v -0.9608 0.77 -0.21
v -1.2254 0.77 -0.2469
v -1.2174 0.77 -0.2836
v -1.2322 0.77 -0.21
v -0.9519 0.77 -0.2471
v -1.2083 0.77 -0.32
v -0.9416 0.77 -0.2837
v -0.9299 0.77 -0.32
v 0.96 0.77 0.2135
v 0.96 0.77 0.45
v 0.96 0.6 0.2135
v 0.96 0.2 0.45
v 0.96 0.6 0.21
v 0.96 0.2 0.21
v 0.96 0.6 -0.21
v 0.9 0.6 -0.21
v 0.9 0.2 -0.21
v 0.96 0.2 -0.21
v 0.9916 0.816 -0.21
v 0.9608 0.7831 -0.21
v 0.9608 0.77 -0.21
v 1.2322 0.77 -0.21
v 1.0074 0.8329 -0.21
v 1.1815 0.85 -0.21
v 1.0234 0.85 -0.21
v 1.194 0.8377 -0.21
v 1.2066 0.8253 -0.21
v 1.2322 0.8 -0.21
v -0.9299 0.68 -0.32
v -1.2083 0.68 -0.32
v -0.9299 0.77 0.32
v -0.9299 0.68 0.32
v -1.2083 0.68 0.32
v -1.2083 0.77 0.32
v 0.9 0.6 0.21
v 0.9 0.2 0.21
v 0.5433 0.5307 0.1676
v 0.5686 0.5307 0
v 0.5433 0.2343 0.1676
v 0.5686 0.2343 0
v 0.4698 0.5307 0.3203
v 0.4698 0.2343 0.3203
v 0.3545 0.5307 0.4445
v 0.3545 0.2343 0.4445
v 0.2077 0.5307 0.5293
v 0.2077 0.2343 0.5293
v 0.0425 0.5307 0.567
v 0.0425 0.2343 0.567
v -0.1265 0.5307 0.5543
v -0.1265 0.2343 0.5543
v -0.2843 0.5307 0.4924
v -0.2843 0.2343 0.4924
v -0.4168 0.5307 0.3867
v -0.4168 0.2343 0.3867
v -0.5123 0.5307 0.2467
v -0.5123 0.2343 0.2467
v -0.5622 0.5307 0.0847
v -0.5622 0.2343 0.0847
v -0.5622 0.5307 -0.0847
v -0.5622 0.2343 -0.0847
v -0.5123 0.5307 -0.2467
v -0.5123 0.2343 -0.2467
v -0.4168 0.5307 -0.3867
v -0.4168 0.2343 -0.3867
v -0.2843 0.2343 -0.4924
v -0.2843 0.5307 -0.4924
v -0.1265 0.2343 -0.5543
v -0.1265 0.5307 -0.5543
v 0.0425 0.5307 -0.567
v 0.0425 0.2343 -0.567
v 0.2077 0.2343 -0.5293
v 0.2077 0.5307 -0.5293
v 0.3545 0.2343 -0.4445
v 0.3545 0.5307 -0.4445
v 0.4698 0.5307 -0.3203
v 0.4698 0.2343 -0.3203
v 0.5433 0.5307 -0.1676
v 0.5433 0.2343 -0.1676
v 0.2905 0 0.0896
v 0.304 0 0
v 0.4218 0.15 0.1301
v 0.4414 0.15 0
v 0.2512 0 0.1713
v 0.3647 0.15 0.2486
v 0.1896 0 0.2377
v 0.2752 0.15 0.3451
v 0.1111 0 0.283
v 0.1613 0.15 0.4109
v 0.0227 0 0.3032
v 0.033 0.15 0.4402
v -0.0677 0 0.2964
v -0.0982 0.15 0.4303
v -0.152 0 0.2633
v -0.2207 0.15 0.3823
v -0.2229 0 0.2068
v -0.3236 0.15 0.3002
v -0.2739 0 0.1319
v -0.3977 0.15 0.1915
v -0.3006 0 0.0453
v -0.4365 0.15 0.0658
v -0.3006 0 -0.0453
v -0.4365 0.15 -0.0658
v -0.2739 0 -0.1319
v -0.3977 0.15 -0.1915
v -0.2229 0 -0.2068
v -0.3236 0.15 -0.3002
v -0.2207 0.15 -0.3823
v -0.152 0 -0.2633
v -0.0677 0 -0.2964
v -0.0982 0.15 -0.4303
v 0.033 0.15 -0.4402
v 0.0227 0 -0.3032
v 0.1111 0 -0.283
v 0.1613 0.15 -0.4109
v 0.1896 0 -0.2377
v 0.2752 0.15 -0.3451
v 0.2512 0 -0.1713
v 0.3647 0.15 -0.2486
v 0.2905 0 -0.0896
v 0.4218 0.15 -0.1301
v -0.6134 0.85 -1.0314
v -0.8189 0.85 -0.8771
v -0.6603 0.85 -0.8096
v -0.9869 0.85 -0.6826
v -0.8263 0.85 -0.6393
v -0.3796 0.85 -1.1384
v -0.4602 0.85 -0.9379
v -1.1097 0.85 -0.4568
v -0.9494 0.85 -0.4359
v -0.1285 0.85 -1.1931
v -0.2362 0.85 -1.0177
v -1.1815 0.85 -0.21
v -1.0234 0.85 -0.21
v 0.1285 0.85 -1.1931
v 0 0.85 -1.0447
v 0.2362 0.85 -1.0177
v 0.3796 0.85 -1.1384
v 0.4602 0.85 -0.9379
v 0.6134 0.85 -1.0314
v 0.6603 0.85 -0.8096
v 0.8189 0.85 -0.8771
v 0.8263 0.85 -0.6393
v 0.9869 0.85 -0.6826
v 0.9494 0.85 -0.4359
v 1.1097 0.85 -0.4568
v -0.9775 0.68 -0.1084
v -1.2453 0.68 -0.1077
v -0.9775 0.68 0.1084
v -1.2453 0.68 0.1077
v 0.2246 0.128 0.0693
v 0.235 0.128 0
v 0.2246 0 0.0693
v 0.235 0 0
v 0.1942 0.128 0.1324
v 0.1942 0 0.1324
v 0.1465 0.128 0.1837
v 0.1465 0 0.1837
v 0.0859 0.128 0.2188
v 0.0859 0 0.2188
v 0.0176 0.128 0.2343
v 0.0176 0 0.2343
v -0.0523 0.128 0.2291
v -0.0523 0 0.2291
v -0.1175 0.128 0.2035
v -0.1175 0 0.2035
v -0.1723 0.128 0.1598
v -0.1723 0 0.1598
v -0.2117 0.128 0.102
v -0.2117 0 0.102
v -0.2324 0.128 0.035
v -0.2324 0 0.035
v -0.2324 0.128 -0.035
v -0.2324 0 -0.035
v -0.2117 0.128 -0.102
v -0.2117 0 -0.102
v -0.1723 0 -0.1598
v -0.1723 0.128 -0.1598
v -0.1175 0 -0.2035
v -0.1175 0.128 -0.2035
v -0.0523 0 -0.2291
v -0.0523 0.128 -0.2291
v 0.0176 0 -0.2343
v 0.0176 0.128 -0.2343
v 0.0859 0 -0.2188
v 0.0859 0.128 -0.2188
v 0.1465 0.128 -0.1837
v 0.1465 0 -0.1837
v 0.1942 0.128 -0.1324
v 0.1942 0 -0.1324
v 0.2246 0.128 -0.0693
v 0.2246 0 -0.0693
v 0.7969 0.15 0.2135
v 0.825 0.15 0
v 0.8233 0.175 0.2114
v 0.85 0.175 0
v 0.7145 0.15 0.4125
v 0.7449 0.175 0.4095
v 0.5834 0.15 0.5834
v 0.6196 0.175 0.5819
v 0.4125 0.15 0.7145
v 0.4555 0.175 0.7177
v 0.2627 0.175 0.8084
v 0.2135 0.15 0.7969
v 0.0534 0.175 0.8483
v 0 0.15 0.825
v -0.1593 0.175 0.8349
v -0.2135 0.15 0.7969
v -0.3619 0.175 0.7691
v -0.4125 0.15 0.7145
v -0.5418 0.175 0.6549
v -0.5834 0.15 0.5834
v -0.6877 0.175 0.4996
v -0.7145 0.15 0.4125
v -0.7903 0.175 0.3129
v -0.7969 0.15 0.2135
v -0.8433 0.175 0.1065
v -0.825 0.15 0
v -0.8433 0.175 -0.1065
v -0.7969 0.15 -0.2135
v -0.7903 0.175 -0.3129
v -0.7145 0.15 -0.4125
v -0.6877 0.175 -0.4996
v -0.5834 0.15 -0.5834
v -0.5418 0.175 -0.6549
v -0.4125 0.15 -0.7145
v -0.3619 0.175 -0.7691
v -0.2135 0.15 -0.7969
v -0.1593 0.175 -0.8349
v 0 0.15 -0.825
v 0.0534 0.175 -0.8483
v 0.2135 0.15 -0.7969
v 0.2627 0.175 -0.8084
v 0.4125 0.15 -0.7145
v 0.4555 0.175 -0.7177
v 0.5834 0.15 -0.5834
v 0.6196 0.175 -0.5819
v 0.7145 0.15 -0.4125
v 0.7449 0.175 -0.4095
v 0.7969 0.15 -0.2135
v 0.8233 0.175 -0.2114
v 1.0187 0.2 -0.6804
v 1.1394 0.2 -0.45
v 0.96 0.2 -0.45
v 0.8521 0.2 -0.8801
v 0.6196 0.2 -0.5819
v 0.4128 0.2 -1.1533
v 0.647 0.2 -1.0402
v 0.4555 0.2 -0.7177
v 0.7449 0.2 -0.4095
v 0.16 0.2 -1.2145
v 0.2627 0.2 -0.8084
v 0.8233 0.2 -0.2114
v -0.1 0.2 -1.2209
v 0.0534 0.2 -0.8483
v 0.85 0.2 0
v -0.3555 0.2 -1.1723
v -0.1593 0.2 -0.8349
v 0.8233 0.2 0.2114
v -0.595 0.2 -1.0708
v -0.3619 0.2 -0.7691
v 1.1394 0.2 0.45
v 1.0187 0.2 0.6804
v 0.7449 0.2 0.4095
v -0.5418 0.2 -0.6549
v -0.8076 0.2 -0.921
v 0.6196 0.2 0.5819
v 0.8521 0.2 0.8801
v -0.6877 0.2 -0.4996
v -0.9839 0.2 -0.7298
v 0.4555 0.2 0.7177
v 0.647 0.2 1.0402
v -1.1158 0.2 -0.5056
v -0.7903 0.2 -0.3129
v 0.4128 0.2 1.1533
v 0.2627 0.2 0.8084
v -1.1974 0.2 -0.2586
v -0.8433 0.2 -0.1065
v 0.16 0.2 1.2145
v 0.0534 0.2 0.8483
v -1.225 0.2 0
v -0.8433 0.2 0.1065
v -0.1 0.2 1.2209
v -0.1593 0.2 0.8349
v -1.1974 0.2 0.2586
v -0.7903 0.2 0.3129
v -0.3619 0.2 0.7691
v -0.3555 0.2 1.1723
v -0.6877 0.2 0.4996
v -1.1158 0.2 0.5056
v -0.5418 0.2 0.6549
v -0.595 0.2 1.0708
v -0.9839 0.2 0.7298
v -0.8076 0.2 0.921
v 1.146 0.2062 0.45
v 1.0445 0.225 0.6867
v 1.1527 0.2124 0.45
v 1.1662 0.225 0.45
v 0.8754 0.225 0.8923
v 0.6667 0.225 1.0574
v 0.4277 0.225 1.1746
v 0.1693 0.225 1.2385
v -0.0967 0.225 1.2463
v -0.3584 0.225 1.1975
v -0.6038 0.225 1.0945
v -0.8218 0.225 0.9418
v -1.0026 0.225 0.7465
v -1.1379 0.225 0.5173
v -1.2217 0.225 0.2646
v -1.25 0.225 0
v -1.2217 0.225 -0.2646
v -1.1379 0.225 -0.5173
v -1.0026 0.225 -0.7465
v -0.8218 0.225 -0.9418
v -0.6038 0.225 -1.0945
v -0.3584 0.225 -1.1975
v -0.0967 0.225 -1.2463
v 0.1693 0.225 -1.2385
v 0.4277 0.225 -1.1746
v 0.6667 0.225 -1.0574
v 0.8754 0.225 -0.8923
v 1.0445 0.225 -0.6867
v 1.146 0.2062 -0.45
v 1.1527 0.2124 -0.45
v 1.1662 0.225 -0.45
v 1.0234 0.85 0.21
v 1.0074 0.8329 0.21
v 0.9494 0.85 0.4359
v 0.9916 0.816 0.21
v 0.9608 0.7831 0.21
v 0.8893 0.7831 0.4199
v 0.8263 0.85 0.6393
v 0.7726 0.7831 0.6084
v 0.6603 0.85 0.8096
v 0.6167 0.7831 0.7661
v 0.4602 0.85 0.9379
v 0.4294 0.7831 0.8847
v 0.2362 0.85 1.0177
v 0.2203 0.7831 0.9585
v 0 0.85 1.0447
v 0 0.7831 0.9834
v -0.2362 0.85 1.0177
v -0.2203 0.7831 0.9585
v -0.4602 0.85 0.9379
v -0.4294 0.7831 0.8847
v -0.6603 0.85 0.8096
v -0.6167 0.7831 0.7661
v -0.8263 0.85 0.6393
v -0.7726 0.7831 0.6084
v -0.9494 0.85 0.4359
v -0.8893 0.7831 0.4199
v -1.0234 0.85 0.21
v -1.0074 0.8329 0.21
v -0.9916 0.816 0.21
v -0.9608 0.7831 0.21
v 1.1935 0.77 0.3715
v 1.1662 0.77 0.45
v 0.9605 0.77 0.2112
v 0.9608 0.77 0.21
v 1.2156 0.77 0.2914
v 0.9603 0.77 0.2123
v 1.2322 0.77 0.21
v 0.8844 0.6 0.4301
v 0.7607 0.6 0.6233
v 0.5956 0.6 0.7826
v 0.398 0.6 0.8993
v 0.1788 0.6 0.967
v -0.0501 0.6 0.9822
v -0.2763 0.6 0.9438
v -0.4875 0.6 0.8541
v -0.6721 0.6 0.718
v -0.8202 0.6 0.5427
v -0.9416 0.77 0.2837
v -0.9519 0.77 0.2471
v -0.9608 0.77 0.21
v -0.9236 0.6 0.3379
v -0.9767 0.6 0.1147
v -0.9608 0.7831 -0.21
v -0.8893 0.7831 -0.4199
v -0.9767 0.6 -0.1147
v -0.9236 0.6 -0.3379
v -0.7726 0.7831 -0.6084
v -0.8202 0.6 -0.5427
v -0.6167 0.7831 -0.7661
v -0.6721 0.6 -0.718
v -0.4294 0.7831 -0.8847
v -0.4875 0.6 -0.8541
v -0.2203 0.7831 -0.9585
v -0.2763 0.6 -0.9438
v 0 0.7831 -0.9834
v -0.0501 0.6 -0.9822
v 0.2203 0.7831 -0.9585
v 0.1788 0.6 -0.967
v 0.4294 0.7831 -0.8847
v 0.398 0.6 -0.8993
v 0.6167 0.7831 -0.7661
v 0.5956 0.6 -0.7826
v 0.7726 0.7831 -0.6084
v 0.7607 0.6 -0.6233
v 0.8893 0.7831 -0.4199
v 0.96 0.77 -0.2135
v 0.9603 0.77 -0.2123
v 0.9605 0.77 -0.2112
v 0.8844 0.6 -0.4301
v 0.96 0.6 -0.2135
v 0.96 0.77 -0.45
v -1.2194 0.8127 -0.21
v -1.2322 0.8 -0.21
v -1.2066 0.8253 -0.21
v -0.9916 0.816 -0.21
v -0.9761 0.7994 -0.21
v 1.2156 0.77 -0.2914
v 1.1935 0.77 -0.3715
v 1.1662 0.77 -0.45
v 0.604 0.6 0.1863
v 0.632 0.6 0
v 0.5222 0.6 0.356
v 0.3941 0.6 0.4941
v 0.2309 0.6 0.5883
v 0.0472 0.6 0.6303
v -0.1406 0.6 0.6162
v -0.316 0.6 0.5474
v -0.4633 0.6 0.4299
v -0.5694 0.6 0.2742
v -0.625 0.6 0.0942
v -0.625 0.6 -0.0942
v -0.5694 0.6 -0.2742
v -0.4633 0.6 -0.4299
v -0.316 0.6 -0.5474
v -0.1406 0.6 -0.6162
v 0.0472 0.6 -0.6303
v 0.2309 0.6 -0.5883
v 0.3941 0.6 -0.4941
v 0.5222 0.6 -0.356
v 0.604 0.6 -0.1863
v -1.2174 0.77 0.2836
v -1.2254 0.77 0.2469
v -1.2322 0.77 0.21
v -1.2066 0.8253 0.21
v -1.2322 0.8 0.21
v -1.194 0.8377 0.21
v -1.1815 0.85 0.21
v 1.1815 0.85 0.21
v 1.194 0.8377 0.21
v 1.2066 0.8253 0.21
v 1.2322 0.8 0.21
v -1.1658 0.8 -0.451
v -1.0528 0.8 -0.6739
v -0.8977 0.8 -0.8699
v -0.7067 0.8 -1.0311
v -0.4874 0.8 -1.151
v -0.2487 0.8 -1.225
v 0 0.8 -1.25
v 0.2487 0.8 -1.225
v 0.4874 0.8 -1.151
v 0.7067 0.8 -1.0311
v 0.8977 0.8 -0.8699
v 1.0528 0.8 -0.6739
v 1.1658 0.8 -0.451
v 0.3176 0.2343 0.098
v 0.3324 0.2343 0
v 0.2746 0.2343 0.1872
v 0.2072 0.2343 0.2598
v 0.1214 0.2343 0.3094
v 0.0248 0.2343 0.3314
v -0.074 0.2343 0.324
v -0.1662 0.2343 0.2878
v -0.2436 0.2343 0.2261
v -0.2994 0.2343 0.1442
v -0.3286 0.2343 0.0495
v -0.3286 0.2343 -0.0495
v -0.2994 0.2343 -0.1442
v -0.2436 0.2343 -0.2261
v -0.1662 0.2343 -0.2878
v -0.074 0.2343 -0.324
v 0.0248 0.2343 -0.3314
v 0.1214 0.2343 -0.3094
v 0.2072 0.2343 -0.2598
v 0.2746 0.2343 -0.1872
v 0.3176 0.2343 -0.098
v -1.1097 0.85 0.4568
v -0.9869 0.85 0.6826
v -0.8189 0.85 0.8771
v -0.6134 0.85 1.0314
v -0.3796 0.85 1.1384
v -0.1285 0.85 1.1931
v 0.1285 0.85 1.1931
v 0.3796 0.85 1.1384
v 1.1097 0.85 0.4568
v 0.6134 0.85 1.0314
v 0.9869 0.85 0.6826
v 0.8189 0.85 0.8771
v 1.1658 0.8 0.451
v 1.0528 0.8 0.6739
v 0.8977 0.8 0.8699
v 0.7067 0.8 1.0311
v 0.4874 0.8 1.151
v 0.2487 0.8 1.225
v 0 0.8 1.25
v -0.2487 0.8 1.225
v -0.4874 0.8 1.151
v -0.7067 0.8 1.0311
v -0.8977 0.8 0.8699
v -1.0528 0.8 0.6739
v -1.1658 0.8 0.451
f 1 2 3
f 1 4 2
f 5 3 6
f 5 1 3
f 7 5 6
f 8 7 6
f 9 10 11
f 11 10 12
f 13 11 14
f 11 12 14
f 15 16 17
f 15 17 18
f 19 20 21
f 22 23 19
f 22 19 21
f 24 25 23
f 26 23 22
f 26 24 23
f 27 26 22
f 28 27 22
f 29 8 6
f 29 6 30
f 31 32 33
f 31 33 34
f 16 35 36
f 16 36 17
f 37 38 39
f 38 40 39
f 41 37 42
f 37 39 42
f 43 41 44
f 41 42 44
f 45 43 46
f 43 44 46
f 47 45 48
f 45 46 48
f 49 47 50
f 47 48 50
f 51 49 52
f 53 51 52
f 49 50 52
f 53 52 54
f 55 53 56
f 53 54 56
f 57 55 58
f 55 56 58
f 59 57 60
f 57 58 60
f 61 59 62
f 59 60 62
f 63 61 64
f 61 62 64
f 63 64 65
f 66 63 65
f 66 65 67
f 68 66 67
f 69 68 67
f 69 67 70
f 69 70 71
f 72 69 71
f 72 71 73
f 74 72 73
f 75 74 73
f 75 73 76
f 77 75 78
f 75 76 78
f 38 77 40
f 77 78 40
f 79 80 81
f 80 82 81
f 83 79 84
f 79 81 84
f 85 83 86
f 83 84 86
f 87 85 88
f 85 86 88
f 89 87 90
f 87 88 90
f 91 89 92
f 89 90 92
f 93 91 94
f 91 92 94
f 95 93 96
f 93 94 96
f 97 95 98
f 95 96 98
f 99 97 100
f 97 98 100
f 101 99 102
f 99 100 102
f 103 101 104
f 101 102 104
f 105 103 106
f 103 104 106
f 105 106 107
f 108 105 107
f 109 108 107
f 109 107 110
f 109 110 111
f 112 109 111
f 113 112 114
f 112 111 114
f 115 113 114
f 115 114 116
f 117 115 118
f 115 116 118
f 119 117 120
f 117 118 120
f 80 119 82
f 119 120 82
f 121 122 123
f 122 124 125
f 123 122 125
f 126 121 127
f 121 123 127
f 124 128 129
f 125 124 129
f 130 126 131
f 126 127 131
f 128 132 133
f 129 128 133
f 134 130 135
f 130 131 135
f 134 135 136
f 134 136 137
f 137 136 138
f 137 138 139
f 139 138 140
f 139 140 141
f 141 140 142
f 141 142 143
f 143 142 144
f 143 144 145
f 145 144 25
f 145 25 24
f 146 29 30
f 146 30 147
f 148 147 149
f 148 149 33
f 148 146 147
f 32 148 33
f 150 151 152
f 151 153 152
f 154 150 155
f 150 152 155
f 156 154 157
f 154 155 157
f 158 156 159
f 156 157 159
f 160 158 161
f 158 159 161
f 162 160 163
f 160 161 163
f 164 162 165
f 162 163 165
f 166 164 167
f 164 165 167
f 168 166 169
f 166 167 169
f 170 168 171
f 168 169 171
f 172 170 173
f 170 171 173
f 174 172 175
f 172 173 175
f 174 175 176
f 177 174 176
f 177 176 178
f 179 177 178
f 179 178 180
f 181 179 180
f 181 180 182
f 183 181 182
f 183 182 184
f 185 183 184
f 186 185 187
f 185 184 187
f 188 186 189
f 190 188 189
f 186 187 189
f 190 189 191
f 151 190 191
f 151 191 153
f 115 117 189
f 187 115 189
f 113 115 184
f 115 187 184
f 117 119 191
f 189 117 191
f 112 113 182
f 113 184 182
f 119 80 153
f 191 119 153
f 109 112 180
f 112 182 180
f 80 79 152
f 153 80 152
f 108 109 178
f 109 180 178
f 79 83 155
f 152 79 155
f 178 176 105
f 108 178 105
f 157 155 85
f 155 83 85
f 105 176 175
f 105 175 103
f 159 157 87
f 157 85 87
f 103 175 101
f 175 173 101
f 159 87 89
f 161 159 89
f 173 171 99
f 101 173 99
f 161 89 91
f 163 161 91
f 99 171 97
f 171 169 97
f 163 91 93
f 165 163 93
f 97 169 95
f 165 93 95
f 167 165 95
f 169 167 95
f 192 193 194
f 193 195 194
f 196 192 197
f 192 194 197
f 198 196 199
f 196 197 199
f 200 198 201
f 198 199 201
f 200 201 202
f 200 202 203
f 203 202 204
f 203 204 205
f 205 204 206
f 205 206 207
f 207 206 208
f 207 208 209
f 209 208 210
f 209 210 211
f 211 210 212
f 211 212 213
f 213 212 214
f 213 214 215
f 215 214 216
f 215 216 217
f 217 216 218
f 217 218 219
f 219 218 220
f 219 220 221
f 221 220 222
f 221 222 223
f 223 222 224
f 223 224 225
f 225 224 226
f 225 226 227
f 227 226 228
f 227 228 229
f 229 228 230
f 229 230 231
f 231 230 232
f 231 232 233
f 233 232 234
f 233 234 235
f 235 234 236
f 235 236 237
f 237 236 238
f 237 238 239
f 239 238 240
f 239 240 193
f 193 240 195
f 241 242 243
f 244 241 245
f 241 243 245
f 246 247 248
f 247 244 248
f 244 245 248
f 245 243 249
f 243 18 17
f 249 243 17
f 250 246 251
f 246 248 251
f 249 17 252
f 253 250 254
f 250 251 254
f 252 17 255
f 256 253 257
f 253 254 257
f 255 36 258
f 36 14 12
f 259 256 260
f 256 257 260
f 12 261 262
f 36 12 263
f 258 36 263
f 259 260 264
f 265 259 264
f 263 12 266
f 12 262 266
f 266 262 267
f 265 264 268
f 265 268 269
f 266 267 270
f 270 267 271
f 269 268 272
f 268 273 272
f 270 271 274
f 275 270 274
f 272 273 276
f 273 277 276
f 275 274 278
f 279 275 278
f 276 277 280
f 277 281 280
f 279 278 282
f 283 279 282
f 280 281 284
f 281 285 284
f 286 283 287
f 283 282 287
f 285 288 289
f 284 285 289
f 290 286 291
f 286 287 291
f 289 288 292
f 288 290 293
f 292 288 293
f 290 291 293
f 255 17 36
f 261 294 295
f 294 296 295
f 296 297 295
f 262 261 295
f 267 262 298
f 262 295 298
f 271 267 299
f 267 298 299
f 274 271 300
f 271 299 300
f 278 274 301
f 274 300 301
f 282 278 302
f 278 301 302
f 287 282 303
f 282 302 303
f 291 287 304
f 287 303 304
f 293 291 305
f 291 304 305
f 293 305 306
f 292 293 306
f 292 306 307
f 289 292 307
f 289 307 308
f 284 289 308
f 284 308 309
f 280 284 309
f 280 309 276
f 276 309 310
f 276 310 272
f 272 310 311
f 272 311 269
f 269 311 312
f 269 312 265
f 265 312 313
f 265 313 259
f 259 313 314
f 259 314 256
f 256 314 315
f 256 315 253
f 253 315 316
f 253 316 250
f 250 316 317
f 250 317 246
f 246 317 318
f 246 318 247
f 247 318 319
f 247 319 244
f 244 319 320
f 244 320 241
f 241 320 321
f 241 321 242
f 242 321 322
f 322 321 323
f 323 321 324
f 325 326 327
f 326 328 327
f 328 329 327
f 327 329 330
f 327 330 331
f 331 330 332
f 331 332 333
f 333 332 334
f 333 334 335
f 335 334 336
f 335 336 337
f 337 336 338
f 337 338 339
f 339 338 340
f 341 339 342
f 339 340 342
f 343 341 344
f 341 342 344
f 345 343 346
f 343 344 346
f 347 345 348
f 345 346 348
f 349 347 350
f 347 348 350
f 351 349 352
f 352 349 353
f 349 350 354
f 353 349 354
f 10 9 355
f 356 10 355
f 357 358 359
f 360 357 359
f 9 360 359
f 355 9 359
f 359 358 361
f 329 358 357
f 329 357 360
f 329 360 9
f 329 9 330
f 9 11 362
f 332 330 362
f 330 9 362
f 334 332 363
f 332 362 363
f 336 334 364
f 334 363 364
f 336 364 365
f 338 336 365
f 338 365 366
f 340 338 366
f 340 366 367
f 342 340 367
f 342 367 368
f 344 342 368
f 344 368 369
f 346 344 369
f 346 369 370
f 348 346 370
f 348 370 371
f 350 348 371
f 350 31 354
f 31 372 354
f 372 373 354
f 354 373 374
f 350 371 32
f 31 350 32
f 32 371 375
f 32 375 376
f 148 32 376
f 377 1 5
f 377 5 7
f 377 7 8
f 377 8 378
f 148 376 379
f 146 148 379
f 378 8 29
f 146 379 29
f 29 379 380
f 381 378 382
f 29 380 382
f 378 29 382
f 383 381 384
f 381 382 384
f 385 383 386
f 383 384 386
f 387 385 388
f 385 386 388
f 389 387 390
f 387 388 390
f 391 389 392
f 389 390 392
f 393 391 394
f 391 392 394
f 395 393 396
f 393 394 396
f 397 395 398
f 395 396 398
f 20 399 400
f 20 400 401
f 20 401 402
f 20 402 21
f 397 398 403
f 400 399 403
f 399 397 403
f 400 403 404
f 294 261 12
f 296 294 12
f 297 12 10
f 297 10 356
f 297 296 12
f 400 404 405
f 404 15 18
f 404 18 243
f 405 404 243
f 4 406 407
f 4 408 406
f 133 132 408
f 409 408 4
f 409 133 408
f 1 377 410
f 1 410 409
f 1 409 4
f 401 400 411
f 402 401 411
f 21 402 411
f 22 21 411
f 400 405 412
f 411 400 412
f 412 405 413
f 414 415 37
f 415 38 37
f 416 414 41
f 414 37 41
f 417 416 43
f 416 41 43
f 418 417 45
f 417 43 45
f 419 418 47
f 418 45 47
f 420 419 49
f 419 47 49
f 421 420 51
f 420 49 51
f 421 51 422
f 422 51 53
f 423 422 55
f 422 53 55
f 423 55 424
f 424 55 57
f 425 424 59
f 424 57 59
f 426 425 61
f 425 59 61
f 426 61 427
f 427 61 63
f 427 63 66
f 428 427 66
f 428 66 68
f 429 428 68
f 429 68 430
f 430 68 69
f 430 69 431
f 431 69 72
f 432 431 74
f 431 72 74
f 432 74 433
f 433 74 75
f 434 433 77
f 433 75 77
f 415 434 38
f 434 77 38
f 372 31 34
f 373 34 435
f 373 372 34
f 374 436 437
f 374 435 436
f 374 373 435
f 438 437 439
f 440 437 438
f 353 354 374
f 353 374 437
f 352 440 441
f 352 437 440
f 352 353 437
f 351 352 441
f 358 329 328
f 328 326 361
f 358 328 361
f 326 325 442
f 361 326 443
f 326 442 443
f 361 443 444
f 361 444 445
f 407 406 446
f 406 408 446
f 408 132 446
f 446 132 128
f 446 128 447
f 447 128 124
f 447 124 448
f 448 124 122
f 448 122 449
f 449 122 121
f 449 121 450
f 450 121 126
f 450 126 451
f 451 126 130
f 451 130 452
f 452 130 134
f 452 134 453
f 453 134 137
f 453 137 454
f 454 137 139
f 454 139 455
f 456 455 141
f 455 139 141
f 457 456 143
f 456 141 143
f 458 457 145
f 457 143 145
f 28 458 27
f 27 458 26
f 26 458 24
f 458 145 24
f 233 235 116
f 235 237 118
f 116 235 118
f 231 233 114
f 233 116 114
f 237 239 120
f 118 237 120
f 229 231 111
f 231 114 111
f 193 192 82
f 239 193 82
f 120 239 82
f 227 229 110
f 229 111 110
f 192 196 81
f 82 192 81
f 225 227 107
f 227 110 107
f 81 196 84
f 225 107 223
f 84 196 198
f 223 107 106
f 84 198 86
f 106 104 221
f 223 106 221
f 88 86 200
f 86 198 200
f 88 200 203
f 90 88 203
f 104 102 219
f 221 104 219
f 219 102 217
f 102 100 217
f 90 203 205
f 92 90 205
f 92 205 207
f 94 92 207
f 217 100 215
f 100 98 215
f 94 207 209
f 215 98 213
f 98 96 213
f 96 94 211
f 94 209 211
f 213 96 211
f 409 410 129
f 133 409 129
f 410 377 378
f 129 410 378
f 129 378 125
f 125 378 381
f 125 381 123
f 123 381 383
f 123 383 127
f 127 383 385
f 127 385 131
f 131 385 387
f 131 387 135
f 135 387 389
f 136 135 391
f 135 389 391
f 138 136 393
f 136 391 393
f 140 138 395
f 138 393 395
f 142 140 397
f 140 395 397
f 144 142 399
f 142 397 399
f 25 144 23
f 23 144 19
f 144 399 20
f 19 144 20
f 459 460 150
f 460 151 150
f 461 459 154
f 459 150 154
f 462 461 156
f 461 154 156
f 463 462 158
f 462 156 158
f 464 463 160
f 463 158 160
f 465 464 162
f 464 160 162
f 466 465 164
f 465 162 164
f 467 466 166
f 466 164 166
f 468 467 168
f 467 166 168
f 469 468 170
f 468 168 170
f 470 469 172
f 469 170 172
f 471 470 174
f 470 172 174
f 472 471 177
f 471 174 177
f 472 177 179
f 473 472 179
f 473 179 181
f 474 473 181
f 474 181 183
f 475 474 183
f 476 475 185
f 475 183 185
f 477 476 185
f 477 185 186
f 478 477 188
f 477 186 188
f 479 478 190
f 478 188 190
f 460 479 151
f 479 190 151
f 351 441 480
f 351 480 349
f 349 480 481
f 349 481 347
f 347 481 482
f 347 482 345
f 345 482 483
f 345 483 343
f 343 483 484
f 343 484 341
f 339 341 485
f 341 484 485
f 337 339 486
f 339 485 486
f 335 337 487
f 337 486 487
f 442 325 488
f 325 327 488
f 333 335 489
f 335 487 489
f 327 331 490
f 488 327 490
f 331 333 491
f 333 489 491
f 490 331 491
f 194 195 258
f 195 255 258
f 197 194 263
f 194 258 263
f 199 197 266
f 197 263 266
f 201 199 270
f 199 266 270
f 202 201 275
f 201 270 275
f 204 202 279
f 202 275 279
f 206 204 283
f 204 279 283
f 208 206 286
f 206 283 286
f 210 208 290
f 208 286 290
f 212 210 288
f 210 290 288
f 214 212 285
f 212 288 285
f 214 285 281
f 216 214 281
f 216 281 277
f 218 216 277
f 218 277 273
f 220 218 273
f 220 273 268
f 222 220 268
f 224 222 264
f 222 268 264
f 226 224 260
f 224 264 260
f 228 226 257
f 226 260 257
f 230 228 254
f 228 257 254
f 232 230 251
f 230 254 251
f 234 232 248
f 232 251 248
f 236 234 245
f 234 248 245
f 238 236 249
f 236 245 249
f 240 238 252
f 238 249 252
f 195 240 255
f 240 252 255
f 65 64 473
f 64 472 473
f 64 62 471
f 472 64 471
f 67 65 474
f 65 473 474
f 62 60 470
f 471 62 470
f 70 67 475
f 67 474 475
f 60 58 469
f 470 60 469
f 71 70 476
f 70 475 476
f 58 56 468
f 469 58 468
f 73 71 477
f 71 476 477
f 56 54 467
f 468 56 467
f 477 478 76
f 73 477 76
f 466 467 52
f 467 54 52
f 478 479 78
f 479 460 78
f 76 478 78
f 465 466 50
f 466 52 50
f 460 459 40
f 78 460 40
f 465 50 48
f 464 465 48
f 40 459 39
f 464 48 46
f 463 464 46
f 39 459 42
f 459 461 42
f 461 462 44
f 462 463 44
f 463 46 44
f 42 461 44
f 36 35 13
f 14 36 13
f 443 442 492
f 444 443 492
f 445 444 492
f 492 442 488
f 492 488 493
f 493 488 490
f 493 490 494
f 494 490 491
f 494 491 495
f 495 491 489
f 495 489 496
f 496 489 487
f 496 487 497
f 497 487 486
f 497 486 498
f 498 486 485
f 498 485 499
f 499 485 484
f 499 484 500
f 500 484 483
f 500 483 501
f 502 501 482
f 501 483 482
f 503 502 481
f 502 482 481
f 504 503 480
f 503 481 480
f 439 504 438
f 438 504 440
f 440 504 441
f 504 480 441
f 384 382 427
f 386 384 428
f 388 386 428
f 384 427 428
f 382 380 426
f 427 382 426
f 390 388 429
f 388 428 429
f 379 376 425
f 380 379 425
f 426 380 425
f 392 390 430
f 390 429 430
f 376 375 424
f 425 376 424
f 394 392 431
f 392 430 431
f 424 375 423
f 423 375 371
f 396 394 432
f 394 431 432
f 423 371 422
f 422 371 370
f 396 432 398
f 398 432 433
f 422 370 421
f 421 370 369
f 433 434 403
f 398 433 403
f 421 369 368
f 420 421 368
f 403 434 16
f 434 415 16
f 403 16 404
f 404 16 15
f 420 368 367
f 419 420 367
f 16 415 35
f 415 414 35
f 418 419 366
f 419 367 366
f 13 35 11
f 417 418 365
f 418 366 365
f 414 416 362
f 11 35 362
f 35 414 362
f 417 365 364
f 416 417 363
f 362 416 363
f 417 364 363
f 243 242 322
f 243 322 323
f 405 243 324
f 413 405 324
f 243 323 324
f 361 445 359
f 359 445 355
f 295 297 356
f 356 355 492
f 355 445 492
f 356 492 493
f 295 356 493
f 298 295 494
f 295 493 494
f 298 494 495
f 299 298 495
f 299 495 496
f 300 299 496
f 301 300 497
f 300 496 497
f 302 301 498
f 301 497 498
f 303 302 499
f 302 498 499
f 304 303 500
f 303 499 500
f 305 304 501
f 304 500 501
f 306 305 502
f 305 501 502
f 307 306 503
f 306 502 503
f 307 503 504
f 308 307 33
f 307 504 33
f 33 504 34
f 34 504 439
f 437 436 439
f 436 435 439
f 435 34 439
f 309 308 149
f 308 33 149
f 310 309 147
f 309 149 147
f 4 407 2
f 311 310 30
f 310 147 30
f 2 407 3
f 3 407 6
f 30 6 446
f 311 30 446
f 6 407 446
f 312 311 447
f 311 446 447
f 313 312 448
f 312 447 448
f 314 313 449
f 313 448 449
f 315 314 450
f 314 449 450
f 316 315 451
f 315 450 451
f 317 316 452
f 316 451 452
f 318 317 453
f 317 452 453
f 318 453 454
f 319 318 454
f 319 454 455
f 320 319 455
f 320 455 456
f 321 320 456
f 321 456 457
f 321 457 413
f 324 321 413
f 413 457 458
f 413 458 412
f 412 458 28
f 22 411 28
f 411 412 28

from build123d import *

# Parameters (mm, degrees)
CUT_EXTRUDE1_REACH = 3.25
CUT_EXTRUDE3_REACH = 2.85
SKETCH4_W          = 0.5796936
SKETCH4_H          = 0.42
SKETCH5_W          = 0.593674822
SKETCH5_H          = 0.9
CUT_EXTRUDE4_DEPTH = 0.77


with BuildPart() as part:
    # Sketch1 → Revolve1 (revolve)
    with BuildSketch(Plane.XY):
        Polygon((0.332352738, 0.234317473), (0.235, 0.128), (0.235, 0), (0.304033675, 0), (0.44138561, 0.15), (0.825, 0.15), (0.85, 0.175), (0.85, 0.2), (1.225, 0.2), (1.25, 0.225), (1.25, 0.8), (1.2, 0.85), (1.044713378, 0.85), (0.983447962, 0.783092952), (0.983447962, 0.6), (0.632036734, 0.6), (0.568557305, 0.530675062), (0.568557305, 0.234317473), align=None)
    revolve(axis=Axis((0, 0.85, 0), (0, -1, 0)))

    # Sketch2 → Cut-Extrude1 (cut, up to next)
    with BuildSketch(Plane(origin=(0, 0, 0), x_dir=(0, 0, -1), z_dir=(1, 0, 0)), mode=Mode.PRIVATE) as cut_extrude1_sk1:
        Polygon((0.21, 0.912296329), (0.21, 0.77), (0.32, 0.77), (0.32, 0.68), (-0.32, 0.68), (-0.32, 0.77), (-0.21, 0.77), (-0.21, 0.912296329), align=None)
    cut_extrude1_tool1 = extrude(cut_extrude1_sk1.sketch, amount=-CUT_EXTRUDE1_REACH, mode=Mode.PRIVATE) & part.part
    add(cut_extrude1_tool1.solids().sort_by_distance((0, 0.784145, 0))[0], mode=Mode.SUBTRACT)

    # Sketch4 → Cut-Extrude3 (cut, up to next)
    with BuildSketch(Plane(origin=(0, 0.85, 0), x_dir=(1, 0, 0), z_dir=(0, 1, 0)), mode=Mode.PRIVATE) as cut_extrude3_sk1:
        with Locations((1.1898468, 0)):
            Rectangle(SKETCH4_W, SKETCH4_H)
    cut_extrude3_tool1 = extrude(cut_extrude3_sk1.sketch, amount=-CUT_EXTRUDE3_REACH, mode=Mode.PRIVATE) & part.part
    add(cut_extrude3_tool1.solids().sort_by_distance((1.189847, 0.85, 0))[0], mode=Mode.SUBTRACT)

    # Sketch5 → Cut-Extrude4 (cut)
    with BuildSketch(Plane(origin=(0, 0, 0), x_dir=(1, 0, 0), z_dir=(0, 1, 0))):
        with Locations((1.256837411, 0)):
            Rectangle(SKETCH5_W, SKETCH5_H)
    extrude(amount=CUT_EXTRUDE4_DEPTH, mode=Mode.SUBTRACT)


solid = part.part
